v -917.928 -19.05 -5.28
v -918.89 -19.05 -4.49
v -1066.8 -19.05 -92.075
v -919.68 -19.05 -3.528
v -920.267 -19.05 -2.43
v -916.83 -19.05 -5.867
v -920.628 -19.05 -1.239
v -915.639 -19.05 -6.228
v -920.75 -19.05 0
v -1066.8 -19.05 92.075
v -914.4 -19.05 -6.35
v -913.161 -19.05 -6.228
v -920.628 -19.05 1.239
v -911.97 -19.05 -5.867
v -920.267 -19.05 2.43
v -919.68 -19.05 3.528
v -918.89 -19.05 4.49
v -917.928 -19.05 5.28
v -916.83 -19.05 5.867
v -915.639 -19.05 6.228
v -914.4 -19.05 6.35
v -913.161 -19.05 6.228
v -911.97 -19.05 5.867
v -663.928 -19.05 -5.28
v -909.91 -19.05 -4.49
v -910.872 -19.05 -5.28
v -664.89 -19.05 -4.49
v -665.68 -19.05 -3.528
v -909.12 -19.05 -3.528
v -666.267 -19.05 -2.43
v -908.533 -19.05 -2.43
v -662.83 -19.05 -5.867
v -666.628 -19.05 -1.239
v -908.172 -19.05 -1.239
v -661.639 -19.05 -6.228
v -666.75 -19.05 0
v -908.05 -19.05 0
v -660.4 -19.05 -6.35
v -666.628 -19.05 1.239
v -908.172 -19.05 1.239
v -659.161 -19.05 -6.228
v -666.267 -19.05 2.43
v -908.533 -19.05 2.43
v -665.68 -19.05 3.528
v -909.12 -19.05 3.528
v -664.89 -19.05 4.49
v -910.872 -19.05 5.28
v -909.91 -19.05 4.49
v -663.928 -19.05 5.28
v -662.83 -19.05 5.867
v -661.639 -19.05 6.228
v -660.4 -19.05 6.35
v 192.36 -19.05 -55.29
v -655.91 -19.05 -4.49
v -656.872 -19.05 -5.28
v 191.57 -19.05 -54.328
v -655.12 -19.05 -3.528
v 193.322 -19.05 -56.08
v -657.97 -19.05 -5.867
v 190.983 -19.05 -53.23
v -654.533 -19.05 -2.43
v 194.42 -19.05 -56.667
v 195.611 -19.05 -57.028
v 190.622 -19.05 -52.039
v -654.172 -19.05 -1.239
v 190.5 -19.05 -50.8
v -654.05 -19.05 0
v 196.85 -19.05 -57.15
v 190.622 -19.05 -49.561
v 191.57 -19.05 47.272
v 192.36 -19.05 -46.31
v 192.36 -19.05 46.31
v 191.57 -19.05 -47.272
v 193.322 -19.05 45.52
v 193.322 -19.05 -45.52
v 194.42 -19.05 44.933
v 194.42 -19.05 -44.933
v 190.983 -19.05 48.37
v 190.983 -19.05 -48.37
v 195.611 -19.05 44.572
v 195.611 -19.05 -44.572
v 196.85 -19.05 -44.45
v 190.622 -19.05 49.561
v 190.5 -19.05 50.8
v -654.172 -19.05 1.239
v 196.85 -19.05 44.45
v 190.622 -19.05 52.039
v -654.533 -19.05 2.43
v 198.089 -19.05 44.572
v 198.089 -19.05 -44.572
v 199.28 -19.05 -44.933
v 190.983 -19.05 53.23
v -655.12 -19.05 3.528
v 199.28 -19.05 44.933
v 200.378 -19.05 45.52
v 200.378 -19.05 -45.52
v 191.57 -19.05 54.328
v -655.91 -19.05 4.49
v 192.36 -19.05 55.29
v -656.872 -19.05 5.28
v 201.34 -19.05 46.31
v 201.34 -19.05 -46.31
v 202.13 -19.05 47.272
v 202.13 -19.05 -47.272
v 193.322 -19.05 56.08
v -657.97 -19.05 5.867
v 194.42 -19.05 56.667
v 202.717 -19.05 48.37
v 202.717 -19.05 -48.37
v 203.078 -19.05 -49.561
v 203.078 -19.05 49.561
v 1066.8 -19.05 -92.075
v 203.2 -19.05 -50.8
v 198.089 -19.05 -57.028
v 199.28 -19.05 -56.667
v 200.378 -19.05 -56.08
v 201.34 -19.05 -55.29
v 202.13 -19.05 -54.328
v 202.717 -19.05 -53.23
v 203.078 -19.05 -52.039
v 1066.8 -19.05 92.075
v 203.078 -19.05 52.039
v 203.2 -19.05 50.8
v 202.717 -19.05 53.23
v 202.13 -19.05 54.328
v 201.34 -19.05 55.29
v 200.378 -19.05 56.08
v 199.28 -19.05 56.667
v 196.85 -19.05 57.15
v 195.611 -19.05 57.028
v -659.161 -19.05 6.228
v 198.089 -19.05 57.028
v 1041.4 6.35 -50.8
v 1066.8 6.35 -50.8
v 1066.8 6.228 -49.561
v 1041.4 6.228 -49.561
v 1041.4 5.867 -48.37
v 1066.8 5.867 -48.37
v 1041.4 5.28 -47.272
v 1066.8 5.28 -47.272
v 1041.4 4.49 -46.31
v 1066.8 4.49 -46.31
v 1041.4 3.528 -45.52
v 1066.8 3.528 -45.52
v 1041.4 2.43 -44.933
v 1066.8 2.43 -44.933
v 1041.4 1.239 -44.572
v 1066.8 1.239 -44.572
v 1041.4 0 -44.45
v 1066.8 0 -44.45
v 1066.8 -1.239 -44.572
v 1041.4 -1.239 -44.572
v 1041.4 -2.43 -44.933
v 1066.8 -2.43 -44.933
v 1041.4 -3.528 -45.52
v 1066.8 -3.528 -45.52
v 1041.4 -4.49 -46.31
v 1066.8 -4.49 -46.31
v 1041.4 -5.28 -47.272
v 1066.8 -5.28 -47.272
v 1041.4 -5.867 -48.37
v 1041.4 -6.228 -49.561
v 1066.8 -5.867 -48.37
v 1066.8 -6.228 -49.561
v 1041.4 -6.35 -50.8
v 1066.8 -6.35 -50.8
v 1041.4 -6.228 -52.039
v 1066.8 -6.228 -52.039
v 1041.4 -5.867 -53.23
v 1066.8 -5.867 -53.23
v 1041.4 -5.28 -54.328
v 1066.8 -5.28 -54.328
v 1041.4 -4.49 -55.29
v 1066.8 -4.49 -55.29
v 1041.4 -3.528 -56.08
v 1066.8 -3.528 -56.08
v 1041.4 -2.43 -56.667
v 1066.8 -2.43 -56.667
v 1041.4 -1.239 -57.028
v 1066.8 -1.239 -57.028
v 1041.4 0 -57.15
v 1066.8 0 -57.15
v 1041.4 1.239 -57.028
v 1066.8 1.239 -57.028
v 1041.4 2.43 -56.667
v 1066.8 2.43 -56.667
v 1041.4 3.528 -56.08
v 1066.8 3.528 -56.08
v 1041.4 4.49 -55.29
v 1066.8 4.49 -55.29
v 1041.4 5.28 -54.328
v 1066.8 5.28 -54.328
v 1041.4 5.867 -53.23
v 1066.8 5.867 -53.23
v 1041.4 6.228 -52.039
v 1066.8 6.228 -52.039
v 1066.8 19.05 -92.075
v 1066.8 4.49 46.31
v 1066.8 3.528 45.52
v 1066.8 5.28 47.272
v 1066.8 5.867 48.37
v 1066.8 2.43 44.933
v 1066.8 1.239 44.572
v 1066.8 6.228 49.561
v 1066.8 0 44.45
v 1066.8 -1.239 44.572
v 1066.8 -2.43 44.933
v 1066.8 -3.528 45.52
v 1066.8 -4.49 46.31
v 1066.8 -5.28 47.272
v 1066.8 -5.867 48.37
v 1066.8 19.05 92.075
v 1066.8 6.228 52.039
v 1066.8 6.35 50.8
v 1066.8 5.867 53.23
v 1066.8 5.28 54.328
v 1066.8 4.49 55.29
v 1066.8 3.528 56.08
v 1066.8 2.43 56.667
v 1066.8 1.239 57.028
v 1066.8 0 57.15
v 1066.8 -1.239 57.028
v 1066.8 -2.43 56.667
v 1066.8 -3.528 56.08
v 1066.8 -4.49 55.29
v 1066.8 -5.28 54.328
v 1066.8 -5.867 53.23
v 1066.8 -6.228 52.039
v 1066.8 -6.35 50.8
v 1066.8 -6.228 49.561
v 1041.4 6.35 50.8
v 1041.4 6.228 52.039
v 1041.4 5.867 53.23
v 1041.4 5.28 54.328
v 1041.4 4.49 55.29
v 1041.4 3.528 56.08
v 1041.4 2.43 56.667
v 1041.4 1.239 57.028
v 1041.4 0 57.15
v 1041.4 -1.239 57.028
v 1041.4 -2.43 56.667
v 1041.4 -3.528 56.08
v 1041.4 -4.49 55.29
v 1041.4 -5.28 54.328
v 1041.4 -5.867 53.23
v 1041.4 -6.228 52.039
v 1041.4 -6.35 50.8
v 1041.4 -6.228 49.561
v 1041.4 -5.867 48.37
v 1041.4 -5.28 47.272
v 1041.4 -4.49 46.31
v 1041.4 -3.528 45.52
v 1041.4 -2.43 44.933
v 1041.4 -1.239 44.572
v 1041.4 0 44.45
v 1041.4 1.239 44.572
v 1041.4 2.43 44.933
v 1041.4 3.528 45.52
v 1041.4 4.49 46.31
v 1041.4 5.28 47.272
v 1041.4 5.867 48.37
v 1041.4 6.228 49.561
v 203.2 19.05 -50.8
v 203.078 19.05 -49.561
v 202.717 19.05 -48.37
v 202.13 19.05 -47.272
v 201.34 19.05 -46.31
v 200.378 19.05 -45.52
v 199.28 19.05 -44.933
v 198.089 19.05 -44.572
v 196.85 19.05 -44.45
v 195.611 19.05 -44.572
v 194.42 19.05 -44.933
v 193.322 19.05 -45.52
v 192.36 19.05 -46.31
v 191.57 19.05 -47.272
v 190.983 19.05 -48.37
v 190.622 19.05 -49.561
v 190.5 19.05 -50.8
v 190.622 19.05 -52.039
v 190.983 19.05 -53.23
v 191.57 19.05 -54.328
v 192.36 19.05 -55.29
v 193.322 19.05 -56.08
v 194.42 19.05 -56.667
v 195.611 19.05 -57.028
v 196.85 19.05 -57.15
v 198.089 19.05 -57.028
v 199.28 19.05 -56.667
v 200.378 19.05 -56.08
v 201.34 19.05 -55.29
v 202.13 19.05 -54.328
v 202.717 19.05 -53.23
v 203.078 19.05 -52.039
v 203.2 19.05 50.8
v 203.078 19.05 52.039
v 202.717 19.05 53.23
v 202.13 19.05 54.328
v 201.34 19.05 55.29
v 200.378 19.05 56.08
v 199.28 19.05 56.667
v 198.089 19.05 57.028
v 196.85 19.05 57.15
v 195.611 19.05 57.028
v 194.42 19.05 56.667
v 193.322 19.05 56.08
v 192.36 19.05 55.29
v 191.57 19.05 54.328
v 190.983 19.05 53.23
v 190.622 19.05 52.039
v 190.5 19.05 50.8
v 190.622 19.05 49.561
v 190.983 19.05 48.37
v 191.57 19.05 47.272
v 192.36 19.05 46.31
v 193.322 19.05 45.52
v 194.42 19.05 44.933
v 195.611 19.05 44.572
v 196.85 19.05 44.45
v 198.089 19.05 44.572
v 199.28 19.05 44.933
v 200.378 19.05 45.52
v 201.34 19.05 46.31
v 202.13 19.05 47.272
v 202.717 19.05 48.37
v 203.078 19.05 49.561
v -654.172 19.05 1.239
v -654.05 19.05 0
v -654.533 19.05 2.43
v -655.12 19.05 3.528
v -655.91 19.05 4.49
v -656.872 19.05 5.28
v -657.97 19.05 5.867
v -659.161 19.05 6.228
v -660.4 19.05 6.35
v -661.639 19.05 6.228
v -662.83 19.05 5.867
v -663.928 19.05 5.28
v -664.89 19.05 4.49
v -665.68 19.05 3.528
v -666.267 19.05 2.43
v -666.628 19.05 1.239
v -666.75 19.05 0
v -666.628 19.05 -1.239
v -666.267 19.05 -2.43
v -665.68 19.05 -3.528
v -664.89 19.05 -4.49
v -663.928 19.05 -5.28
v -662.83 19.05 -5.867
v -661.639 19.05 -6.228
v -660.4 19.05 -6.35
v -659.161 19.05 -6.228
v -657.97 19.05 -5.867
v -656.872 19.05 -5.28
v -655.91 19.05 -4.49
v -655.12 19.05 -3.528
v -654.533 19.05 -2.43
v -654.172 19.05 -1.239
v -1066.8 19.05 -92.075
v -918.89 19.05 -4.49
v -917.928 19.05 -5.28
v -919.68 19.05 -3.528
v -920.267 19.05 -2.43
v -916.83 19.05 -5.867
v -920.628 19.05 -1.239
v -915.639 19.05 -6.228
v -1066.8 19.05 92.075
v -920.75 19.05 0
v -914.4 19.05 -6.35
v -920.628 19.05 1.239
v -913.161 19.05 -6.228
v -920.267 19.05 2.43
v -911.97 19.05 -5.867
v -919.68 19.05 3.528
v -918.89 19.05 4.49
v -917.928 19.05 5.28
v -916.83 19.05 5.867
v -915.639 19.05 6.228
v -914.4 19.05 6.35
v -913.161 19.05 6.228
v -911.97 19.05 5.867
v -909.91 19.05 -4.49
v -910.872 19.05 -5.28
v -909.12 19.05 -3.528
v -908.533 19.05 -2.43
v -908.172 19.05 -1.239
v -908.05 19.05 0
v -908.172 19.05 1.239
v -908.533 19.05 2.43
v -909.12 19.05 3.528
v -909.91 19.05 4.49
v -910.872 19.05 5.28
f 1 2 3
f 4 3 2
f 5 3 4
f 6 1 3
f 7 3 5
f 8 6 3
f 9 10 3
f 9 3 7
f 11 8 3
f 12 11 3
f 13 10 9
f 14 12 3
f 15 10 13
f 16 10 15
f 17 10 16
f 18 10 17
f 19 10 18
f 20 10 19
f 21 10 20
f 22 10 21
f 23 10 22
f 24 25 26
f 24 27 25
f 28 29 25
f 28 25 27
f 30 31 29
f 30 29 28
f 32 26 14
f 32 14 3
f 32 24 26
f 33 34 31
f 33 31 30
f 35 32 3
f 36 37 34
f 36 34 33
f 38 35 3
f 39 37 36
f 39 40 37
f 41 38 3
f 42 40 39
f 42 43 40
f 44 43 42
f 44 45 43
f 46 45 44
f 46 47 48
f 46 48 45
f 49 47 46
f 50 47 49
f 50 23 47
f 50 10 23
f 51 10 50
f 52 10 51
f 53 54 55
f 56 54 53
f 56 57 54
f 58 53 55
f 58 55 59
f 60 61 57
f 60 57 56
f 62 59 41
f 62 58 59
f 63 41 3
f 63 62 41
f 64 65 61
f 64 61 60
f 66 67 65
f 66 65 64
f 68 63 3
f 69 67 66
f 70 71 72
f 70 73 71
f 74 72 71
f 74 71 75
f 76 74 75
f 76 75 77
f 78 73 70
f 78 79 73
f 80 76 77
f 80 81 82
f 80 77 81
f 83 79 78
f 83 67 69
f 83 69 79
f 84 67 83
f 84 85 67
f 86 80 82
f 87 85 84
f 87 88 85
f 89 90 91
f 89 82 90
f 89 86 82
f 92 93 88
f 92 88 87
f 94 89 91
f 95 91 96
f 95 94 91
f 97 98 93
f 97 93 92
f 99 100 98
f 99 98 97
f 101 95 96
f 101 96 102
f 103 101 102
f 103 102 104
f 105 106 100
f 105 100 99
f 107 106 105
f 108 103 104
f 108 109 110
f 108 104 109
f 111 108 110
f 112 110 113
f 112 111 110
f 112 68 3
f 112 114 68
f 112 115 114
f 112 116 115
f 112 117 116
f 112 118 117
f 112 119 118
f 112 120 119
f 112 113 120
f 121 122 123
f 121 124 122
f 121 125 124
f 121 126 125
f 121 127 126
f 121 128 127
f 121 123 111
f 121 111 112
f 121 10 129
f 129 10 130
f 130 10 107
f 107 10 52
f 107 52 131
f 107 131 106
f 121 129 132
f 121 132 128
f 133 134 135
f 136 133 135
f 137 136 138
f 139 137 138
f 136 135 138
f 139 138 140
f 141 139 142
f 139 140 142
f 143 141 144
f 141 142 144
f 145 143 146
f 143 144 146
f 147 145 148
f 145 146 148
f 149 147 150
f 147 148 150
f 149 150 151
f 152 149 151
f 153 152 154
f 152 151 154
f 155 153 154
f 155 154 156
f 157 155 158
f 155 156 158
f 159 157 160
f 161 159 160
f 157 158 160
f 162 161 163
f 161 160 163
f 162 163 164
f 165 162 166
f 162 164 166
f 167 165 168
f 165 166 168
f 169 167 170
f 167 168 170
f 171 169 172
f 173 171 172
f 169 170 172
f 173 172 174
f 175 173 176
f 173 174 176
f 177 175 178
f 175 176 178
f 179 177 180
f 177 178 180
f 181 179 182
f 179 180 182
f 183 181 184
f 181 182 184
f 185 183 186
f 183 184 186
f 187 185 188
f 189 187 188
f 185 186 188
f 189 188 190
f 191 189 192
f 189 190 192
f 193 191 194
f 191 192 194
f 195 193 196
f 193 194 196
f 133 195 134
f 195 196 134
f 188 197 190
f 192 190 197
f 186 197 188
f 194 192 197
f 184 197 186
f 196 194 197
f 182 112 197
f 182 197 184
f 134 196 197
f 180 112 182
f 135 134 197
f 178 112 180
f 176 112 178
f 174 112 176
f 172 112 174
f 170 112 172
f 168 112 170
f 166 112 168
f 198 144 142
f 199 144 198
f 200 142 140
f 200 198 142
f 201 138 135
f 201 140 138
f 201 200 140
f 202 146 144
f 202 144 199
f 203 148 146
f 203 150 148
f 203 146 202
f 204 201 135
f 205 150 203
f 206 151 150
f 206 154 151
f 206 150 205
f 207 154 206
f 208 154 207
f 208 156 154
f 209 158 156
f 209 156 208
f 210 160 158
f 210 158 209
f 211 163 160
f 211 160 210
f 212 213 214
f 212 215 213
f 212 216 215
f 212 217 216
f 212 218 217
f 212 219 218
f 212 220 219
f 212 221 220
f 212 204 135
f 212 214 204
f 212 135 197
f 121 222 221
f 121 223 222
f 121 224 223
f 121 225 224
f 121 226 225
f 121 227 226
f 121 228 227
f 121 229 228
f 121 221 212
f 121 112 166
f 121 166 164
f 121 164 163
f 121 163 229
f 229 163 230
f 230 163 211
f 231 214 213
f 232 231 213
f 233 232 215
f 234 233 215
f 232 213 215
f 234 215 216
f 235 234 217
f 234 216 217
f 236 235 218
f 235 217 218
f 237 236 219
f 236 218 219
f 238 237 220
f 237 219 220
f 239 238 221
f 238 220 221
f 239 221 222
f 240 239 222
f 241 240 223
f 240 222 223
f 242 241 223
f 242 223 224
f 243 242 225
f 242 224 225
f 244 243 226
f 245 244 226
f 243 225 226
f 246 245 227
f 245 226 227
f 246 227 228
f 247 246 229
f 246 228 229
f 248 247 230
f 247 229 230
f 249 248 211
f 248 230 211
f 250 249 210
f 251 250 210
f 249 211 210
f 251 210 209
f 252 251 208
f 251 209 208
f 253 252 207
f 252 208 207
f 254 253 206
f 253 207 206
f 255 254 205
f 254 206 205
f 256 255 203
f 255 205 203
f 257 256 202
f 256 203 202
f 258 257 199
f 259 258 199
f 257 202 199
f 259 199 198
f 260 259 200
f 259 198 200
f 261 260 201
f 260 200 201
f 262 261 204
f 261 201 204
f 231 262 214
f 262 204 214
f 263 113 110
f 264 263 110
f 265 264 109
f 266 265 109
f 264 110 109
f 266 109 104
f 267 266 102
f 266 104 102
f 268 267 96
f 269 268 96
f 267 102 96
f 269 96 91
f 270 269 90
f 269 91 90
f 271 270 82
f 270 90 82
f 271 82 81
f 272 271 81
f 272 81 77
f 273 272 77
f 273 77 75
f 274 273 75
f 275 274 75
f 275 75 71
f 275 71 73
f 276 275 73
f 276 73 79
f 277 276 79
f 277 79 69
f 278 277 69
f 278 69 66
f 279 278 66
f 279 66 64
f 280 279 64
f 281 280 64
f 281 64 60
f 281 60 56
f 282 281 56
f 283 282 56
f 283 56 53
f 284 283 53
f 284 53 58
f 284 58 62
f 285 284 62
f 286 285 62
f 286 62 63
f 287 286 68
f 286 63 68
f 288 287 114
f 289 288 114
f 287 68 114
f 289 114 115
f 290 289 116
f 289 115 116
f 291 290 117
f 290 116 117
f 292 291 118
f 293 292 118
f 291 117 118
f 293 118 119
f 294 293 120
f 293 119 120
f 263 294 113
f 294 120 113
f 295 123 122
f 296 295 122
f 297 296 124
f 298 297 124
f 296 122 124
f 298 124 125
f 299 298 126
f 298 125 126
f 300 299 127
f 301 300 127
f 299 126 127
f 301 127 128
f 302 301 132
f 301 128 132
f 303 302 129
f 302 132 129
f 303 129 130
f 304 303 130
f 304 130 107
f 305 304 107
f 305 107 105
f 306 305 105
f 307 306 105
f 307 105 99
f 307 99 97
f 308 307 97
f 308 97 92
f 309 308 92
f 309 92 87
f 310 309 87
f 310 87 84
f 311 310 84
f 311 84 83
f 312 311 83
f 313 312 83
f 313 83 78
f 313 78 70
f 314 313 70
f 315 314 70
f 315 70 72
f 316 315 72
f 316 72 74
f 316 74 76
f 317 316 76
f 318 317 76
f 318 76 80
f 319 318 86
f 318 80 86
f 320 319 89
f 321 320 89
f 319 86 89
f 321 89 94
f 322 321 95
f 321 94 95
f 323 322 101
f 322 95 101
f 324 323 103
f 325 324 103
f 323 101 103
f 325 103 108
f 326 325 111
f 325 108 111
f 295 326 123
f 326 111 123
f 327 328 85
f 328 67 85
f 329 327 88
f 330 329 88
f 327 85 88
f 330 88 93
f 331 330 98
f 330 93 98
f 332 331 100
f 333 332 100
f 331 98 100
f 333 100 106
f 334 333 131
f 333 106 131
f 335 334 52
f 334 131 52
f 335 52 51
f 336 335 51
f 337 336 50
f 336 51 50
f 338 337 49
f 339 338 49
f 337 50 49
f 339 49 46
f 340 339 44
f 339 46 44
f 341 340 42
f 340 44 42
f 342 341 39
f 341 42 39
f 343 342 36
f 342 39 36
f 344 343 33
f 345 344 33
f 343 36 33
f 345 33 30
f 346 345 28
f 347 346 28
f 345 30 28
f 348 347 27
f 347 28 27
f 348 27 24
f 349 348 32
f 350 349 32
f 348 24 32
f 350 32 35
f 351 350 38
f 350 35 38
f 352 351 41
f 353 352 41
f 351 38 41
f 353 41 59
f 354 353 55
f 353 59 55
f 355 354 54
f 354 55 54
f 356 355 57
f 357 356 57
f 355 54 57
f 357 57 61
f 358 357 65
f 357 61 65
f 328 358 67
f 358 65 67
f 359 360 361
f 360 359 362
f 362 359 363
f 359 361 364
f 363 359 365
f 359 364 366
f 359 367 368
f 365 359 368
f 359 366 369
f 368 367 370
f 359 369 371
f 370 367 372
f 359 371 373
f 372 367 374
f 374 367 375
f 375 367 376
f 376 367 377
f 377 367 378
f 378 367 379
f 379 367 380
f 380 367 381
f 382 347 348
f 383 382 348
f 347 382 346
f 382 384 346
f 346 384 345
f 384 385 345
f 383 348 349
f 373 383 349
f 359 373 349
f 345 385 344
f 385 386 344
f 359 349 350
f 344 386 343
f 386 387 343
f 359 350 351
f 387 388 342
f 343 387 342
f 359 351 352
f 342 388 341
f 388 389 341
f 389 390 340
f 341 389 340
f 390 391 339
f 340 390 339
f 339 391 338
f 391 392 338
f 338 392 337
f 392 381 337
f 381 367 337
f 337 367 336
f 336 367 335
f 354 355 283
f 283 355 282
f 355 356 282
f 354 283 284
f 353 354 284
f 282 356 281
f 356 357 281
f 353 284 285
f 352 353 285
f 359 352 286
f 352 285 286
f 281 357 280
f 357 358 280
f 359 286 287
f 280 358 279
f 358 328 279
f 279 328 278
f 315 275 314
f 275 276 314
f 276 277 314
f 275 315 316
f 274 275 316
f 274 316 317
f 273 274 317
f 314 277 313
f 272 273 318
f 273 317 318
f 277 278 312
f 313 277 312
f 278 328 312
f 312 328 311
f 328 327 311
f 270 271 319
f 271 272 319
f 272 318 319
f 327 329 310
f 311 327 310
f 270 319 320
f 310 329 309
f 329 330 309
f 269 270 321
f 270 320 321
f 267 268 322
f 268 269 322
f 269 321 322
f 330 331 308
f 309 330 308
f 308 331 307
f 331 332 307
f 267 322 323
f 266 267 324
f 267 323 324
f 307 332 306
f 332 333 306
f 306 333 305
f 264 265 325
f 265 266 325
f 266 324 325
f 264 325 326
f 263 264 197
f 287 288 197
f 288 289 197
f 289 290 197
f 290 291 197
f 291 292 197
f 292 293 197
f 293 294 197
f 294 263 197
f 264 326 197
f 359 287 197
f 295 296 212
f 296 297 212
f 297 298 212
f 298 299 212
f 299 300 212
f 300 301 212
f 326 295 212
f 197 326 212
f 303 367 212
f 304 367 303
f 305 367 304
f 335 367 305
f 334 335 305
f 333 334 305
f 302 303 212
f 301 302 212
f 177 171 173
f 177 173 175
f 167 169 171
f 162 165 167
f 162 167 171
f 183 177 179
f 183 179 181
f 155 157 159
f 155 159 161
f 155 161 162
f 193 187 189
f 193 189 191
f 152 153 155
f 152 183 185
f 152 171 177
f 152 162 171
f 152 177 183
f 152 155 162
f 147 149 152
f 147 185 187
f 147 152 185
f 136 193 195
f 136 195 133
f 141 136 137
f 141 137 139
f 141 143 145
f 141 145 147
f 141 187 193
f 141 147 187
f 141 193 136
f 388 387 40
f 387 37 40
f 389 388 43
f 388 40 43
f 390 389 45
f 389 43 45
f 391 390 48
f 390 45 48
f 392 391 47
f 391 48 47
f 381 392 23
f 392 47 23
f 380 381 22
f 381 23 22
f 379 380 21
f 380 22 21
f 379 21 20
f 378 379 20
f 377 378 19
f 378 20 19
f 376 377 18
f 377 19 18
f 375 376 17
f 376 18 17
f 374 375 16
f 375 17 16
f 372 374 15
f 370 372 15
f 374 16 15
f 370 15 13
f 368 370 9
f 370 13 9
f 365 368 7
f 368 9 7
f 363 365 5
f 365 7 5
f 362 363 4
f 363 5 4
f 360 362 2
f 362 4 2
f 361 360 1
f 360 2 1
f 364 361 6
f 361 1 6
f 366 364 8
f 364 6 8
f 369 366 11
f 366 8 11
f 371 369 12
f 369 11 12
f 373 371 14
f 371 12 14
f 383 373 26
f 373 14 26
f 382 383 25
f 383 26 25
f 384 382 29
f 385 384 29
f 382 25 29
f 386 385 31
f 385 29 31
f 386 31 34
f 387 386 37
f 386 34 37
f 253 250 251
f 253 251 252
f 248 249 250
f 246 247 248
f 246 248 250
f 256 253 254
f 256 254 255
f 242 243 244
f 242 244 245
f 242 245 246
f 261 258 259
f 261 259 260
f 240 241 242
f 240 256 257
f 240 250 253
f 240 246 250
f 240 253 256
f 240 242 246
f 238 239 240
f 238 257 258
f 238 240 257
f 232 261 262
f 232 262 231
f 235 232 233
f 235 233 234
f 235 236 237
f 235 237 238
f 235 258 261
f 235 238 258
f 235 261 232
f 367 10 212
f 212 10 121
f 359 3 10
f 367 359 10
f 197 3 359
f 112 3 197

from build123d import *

# Parameters (mm, degrees)
F0_W     = 2133.6
F0_H     = 184.15
F1_DEPTH = 19.05
F2_R     = 6.35
F3_DEPTH = 25.4
F4_R     = 6.35
F5_DEPTH = 50.8
F6_R     = 6.35
F7_DEPTH = 25.4


with BuildPart() as f1:
    # F0 (on Front) → F1 (new body, symmetric)
    with BuildSketch(Plane.XZ):
        Rectangle(F0_W, F0_H)
    extrude(amount=F1_DEPTH, both=True)

    # F2 (on face) → F3 (cut)
    with BuildSketch(Plane.YZ.offset(1066.8)):
        with Locations((0, 50.8)):
            Circle(F2_R)
        with Locations((0, -50.8)):
            Circle(F2_R)
    extrude(amount=-F3_DEPTH, mode=Mode.SUBTRACT)

    # F4 (on face) → F5 (cut)
    with BuildSketch(Plane.XZ.offset(19.05)):
        with Locations((196.85, 50.8)):
            Circle(F4_R)
        with Locations((196.85, -50.8)):
            Circle(F4_R)
    extrude(amount=-F5_DEPTH, mode=Mode.SUBTRACT)

    # F6 (on Front) → F7 (cut, symmetric)
    with BuildSketch(Plane.XZ):
        with Locations((-914.4, 0)):
            Circle(F6_R)
        with Locations((-660.4, 0)):
            Circle(F6_R)
    extrude(amount=F7_DEPTH, both=True, mode=Mode.SUBTRACT)


solid = f1.part
